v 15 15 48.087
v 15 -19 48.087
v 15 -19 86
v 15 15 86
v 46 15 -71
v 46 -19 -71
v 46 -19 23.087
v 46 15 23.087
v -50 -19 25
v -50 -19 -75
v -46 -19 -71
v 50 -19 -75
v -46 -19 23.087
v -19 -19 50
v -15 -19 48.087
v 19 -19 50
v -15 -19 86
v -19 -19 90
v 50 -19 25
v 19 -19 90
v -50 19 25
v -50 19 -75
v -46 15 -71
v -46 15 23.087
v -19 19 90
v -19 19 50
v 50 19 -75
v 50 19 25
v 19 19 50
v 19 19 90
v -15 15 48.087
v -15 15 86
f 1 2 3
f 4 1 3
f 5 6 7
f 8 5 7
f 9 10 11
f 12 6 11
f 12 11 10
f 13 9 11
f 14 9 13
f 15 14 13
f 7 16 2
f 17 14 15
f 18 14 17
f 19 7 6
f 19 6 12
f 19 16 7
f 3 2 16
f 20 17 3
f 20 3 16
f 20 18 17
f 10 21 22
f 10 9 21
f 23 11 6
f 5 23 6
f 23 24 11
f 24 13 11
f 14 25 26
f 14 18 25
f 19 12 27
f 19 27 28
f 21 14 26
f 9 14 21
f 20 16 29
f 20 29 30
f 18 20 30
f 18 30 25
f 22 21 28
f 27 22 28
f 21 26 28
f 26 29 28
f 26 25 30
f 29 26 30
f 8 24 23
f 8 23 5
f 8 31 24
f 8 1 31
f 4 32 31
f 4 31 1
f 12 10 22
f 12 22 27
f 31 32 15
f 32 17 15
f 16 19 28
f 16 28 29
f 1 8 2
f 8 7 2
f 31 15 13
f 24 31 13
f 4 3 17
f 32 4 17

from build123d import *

# Parameters (mm, degrees)
F1_DEPTH = 19
F2_T     = -4


with BuildPart() as f1:
    # F0 (on Front) → F1 (new body, symmetric)
    with BuildSketch(Plane.XZ):
        Polygon((-50, 25), (-50, -75), (50, -75), (50, 25), (19, 50), (19, 90), (-19, 90), (-19, 50), align=None)
    extrude(amount=F1_DEPTH, both=True)

    # F2
    f2_openings = [f1.faces().sort_by_distance(p)[0] for p in [
        (0, -19, -6.201711),
    ]]
    offset(amount=F2_T, openings=f2_openings, kind=Kind.INTERSECTION)


solid = f1.part
